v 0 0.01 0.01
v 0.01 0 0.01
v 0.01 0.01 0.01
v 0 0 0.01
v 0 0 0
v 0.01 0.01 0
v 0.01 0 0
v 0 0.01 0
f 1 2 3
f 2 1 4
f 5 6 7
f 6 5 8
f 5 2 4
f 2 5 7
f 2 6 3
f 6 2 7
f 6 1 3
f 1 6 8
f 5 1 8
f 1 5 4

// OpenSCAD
// @regression: deliberate
/***
 * @function tooth_generation_equivalence
 * @brief Keep the oracle export non-empty so the regression runner can execute it as
 * Source: [`tooth/generation/equivalence.scad`](tooth/generation/equivalence.scad)
 *
 * an ordinary OpenSCAD case while the assertions remain the actual test.
 */
include <../../../src/common/curve_gears_math.scad>
include <reference.scad>

function old_points(m,z,pa) = reference_tooth_points(m,z,pa);
for(m=[0.05,0.8,0.999999,1,2,8], z=[5,5.5,34,200], pa=[14.5,20,35]) {
    a=old_points(m,z,pa);b=_cg_tooth_polygon(m,z,pa);
    assert(len(a)==len(b),"flank sample count changed");
    for(i=[0:len(a)-1]) assert(norm(a[i]-b[i])<1e-7,"tooth coordinate drift");
    assert(abs(_cg_dedendum(m)-(m+m/6))<1e-7,"root depth drift");
    assert(abs(_cg_dedendum(m,_cg_default_clearance(m))-_cg_dedendum(m))<1e-7,"clearance default drift");
    c=_cg_tooth_polygon(m,z,pa,_cg_default_backlash(m));
    for(i=[0:len(a)-1]) assert(norm(a[i]-c[i])<1e-7,"explicit default backlash drift");
}
assert(_cg_tooth_angles(1,34,20,0.1)[3]<_cg_tooth_angles(1,34,20,0)[3],"positive backlash must thin teeth");
assert(_cg_dedendum(1,0.2)>_cg_dedendum(1,0.1),"positive clearance must deepen root");
echo("PASS: 72 tooth cases; all flank coordinates within 1e-7");

cube([0.01,0.01,0.01]);
